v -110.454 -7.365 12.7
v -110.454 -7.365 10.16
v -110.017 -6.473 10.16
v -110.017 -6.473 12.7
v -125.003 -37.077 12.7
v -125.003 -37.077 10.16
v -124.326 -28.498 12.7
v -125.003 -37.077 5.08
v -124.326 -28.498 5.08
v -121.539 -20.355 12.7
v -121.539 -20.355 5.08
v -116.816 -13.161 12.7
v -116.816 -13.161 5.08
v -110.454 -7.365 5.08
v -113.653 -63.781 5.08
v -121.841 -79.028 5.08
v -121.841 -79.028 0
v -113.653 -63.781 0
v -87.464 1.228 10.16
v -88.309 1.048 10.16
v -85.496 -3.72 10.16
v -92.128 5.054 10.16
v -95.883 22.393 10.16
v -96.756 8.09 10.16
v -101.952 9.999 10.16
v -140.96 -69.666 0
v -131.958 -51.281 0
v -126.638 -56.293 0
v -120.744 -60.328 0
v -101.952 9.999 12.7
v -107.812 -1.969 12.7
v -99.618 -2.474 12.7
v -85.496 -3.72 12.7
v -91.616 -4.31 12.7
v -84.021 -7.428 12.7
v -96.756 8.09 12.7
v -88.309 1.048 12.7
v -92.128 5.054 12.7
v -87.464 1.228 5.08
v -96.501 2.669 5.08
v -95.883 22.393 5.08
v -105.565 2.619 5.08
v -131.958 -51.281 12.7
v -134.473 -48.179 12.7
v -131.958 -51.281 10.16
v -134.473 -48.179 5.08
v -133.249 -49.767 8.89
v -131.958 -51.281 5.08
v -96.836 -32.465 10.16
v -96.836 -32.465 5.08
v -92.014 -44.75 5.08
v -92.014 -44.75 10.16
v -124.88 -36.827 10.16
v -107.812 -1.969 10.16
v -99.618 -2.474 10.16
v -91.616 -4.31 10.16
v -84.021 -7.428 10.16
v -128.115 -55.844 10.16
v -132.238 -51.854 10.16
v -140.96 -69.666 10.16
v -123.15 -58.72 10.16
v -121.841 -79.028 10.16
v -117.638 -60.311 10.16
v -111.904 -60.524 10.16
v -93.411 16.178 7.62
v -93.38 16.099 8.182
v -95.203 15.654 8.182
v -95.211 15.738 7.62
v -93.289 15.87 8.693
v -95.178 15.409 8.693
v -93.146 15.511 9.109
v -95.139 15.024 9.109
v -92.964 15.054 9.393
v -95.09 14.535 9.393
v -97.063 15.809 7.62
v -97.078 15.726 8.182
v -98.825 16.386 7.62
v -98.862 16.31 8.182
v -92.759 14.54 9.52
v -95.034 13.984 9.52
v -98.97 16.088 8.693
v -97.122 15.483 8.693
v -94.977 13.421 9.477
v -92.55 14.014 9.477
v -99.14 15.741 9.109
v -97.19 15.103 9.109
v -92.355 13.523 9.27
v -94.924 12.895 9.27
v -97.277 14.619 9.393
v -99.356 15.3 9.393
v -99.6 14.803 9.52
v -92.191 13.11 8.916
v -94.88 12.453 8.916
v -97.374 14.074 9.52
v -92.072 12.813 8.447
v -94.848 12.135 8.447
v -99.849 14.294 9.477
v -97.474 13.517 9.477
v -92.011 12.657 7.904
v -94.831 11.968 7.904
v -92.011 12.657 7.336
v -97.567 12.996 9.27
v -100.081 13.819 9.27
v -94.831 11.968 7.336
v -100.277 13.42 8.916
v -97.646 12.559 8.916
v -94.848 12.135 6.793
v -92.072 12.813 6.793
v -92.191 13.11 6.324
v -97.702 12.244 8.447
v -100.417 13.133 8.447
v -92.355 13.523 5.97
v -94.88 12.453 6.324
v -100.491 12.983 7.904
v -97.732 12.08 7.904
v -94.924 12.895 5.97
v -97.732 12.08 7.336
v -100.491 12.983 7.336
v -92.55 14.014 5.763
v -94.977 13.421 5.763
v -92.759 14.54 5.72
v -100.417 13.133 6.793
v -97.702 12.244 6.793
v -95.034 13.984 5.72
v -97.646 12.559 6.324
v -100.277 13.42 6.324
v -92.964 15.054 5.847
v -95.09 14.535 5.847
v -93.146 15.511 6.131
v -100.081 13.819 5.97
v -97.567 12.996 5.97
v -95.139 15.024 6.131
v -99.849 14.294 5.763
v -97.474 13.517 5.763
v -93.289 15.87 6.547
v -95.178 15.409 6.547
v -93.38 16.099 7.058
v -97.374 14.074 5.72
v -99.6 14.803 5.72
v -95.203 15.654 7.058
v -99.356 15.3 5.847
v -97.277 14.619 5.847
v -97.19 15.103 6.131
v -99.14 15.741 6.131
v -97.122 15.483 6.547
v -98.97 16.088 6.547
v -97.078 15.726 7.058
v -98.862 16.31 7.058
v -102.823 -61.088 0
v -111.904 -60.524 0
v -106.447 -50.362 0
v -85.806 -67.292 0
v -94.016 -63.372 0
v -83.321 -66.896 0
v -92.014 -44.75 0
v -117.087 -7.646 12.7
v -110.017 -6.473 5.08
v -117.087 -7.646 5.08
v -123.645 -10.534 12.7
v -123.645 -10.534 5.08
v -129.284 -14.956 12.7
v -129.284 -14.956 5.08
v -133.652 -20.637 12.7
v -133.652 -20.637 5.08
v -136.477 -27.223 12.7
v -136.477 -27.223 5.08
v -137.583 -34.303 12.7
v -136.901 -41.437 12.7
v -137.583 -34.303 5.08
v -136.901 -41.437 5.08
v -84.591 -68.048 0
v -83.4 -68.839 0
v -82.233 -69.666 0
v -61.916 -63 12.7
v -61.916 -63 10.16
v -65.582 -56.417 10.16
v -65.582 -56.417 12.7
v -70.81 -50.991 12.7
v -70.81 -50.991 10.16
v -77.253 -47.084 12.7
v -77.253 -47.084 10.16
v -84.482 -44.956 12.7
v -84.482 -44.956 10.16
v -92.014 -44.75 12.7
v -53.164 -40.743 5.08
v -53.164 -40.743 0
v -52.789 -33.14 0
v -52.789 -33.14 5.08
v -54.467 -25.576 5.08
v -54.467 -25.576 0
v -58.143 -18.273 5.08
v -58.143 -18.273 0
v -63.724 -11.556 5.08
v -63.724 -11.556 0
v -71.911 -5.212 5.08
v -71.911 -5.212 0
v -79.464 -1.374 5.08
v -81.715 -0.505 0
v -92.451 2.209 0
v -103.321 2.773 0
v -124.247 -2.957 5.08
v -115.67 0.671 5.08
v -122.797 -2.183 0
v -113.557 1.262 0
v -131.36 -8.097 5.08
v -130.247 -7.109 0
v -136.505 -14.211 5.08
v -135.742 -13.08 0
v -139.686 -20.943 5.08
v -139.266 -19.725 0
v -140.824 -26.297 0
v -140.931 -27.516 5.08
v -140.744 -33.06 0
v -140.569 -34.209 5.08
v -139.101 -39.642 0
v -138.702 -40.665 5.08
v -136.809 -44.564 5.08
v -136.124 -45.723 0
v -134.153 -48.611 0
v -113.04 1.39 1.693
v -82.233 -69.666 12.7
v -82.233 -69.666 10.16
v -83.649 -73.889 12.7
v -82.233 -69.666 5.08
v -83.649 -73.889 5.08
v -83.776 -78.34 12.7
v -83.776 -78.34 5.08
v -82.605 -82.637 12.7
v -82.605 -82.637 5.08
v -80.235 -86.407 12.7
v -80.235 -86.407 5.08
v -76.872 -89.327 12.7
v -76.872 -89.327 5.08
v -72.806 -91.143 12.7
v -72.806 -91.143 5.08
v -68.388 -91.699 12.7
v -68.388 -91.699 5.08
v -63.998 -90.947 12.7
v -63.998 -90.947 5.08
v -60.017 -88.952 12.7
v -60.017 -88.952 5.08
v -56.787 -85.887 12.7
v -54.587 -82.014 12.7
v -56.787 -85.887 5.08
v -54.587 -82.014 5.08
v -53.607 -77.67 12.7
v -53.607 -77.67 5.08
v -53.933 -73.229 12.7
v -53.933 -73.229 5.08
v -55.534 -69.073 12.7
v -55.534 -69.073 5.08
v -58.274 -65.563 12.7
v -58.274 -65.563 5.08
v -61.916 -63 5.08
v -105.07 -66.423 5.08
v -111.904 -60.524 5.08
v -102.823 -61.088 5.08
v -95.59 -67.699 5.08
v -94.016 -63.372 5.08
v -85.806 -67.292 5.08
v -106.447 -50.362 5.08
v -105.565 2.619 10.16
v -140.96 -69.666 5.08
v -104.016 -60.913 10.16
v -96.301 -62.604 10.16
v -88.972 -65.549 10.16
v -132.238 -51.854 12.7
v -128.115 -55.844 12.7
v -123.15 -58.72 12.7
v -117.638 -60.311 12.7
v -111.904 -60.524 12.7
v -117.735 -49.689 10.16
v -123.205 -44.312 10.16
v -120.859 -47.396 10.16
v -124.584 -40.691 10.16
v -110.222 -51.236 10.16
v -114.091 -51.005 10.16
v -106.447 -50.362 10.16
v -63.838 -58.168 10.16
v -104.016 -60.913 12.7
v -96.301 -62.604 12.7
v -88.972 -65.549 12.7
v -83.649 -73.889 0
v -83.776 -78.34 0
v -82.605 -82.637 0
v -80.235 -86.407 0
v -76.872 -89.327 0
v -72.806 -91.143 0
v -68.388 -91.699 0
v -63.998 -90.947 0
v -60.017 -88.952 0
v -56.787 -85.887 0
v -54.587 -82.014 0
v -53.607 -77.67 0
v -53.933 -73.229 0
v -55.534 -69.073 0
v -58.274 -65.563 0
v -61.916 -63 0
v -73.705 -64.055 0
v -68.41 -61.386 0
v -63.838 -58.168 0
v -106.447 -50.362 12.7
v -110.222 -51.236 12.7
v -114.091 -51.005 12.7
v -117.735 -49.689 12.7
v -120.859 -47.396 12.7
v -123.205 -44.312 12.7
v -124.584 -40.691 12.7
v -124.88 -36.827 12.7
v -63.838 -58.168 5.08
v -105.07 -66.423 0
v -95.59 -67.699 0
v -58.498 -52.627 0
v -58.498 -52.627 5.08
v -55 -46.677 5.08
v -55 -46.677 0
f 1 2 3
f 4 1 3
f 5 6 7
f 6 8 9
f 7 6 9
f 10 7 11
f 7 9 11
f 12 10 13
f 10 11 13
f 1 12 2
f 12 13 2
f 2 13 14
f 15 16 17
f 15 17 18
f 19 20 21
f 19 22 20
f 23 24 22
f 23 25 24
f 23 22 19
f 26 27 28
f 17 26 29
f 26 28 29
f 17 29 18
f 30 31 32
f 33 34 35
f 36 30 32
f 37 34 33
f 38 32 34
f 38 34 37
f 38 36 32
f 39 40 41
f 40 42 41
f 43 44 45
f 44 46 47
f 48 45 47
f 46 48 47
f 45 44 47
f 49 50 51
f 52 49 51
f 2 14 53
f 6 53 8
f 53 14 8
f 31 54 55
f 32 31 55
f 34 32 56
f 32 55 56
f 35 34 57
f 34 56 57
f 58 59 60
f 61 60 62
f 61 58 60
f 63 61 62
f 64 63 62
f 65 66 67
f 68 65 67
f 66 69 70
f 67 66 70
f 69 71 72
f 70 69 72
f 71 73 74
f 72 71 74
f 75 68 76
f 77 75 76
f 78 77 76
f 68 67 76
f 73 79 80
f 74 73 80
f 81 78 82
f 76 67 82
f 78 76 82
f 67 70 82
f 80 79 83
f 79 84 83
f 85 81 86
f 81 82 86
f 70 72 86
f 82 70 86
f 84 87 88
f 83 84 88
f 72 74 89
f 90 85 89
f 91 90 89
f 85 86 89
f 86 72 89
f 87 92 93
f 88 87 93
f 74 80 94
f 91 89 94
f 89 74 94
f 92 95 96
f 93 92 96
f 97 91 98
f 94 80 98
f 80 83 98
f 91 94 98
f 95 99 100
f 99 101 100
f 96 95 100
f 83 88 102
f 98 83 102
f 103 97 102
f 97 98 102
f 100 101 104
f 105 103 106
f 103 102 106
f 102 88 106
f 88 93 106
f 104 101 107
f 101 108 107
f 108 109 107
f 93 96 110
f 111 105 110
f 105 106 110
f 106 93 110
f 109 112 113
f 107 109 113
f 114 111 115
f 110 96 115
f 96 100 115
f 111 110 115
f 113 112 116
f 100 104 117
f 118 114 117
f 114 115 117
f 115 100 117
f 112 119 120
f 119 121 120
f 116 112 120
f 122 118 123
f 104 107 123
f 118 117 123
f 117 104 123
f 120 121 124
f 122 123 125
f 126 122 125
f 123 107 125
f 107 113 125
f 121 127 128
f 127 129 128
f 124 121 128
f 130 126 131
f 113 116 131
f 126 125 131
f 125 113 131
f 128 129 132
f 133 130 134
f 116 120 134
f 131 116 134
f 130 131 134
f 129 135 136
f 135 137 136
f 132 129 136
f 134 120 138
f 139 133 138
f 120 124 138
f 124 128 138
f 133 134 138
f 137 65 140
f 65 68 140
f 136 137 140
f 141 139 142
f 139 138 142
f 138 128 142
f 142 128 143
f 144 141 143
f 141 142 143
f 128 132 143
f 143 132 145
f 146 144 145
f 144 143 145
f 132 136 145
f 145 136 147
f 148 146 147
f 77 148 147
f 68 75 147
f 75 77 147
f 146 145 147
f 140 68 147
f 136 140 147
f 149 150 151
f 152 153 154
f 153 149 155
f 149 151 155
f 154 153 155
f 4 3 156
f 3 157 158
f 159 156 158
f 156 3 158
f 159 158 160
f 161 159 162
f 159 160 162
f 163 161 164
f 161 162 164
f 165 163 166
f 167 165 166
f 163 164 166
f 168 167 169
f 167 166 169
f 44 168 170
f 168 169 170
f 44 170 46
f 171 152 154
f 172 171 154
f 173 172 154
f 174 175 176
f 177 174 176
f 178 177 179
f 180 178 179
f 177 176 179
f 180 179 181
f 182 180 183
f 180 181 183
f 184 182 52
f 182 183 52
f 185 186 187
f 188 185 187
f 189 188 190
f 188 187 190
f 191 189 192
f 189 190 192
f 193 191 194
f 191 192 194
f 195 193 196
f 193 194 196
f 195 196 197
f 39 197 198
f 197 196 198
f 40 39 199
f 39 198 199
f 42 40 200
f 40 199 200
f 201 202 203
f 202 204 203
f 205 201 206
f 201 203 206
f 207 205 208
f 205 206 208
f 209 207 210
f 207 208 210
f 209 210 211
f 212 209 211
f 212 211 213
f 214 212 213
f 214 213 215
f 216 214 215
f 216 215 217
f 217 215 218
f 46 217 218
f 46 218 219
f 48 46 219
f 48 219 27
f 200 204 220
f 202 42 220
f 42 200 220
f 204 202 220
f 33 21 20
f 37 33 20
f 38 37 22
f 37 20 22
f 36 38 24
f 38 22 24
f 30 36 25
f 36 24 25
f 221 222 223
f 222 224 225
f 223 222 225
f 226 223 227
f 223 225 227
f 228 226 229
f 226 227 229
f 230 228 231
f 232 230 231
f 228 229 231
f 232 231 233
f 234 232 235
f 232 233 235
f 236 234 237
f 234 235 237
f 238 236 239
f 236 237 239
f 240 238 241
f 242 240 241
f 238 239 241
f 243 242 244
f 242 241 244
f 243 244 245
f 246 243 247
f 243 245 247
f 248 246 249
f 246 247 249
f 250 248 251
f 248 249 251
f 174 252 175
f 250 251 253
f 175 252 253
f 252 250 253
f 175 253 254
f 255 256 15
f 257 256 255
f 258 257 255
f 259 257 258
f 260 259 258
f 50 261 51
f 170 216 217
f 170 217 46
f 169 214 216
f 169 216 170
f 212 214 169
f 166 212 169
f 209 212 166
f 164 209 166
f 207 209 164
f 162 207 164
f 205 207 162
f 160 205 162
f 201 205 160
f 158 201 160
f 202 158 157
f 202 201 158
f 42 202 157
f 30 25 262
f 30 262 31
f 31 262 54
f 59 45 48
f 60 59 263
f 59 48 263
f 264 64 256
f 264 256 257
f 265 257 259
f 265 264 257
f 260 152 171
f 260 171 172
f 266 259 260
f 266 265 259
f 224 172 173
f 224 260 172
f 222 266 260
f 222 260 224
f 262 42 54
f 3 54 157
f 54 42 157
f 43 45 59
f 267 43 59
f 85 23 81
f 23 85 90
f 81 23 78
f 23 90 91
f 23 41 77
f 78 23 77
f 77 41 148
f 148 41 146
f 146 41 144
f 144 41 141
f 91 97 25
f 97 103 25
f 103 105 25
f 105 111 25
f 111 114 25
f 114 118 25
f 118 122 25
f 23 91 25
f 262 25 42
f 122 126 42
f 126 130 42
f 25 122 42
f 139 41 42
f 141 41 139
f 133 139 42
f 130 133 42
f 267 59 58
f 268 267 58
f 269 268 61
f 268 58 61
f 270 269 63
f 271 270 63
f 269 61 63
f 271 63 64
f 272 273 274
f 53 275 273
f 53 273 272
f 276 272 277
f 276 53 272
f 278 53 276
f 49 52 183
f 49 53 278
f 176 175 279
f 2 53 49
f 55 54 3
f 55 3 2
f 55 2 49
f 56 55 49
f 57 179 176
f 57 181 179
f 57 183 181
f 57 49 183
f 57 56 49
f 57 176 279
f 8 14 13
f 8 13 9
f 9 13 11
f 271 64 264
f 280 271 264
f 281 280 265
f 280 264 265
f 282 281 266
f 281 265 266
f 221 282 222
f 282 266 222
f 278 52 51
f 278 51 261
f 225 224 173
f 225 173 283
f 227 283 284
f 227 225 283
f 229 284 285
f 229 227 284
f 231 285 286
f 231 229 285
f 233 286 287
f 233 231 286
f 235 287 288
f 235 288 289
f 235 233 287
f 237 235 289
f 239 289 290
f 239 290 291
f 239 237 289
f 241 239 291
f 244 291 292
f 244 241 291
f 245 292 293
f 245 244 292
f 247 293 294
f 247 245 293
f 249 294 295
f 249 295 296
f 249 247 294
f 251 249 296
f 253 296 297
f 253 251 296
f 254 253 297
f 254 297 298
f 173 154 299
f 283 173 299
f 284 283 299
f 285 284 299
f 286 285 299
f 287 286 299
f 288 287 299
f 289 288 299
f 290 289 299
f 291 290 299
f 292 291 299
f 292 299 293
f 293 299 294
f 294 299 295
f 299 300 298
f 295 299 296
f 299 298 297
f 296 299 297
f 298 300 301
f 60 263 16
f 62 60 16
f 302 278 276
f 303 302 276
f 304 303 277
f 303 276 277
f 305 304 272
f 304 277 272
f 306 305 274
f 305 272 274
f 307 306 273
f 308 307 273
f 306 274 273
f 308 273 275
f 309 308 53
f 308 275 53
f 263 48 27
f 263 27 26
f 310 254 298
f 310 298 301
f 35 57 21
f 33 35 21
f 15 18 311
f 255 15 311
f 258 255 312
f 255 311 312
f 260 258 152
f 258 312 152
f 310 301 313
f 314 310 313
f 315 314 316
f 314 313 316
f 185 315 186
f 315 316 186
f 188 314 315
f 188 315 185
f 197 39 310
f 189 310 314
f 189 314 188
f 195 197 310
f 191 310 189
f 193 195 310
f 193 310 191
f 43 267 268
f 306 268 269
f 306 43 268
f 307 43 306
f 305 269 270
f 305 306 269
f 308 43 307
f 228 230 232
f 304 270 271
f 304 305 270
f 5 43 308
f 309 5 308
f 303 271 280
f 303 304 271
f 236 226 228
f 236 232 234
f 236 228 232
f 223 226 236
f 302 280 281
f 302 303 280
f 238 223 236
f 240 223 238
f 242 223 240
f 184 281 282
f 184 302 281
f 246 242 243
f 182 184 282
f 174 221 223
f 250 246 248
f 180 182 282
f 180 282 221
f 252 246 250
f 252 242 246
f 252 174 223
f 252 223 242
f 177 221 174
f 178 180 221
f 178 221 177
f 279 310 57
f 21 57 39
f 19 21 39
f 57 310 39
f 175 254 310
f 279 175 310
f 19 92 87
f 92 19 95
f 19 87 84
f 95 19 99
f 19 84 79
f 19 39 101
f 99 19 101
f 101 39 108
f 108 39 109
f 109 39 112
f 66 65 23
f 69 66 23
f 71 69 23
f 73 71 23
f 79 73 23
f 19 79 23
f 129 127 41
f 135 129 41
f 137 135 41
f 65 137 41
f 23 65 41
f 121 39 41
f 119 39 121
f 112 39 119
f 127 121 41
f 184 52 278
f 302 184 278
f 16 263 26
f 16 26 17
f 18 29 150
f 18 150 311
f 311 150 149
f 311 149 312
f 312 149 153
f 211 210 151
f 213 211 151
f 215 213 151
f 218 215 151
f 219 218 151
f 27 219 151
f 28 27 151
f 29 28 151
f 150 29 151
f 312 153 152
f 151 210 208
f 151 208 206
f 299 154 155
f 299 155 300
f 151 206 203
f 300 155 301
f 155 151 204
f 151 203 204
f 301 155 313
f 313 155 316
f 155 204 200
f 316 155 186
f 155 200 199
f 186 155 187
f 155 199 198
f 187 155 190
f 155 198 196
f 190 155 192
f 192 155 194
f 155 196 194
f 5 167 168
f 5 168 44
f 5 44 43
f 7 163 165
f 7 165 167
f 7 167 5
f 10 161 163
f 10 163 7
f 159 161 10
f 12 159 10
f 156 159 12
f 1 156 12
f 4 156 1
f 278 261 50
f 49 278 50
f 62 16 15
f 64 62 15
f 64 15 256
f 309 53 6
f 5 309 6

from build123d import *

# Parameters (mm, degrees)
F1_DEPTH  = 5.08
F3_DEPTH  = 5.08
F5_DEPTH  = 2.54
F7_DEPTH  = 10.16
F8_DEPTH  = 5.08
F9_DEPTH  = 5.08
F11_DEPTH = 7.62
F12_DEPTH = 2.54
F13_R     = 1.905


with BuildPart() as f1:
    # F0 (on Top) → F1 (new body)
    with BuildSketch(Plane.XY):
        with BuildLine():
            add(Edge.make_bspline(
                [(-53.1635676672, -40.7425994368), (-41.8989411061, 18.6911877843), (-113.0400156659, 1.3903249669), (-184.1810902258, -15.9105378505), (-124.304642227, -58.0434622542), (-64.4281942283, -100.1763866579), (-53.1635676672, -40.7425994368)],
                knots=[0, 0, 0, 2.0943951024, 2.0943951024, 4.1887902048, 4.1887902048, 6.2831853072, 6.2831853072, 6.2831853072], degree=2, weights=[1, 0.5, 1, 0.5, 1, 0.5, 1]))
        make_face()
    extrude(amount=F1_DEPTH)

    # F2 (on face) → F3 (join)
    with BuildSketch(Plane.XY.offset(5.08)):
        with BuildLine():
            Line((-131.9579197109, -51.2809136758), (-140.9604847431, -69.6664303541))
            Line((-140.9604847431, -69.6664303541), (-121.8411935672, -79.0282919321))
            Line((-121.8411935672, -79.0282919321), (-113.6531802251, -63.7810597846))
            add(Edge.make_bspline(
                [(-131.9579197109, -51.2809136758), (-128.6186368439, -55.0078578531), (-124.304642227, -58.0434622542), (-119.420845427, -61.4800161624), (-113.6531802251, -63.7810597846)],
                knots=[3.9072776048, 3.9072776048, 3.9072776048, 4.1887902048, 4.1887902048, 4.50468154, 4.50468154, 4.50468154], degree=2, weights=[0.8836543185, 0.9327938173, 1, 0.9245864988, 0.8719217822]))
        make_face()
        with BuildLine():
            Line((-105.5654466698, 2.6191971859), (-131.9579197109, -51.2809136758))
            add(Edge.make_bspline(
                [(-131.9579197109, -51.2809136758), (-128.6186368439, -55.0078578531), (-124.304642227, -58.0434622542), (-119.420845427, -61.4800161624), (-113.6531802251, -63.7810597846)],
                knots=[3.9072776048, 3.9072776048, 3.9072776048, 4.1887902048, 4.1887902048, 4.50468154, 4.50468154, 4.50468154], degree=2, weights=[0.8836543185, 0.9327938173, 1, 0.9245864988, 0.8719217822]))
            Line((-113.6531802251, -63.7810597846), (-96.8360751867, -32.4652455747))
            Line((-96.8360751867, -32.4652455747), (-83.3206423237, -66.8956124574))
            add(Edge.make_bspline(
                [(-83.3206423237, -66.8956124574), (-71.8467350955, -64.7720622624), (-63.8384492188, -58.1680738766)],
                knots=[5.1773121683, 5.1773121683, 5.1773121683, 5.6685915269, 5.6685915269, 5.6685915269], degree=2, weights=[0.7507848699, 0.7442133059, 0.7926641772]))
            Line((-63.8384492188, -58.1680738766), (-87.4642972057, 1.227759617))
            add(Edge.make_bspline(
                [(-87.4642972057, 1.227759617), (-96.5007837018, 3.4317958299), (-105.5654466698, 2.6191971859)],
                knots=[1.4695457005, 1.4695457005, 1.4695457005, 1.8905356916, 1.8905356916, 1.8905356916], degree=2, weights=[0.7906652984, 0.8311998282, 0.9121385395]))
        make_face()
        with BuildLine():
            add(Edge.make_bspline(
                [(-83.3206423237, -66.8956124574), (-71.8467350955, -64.7720622624), (-63.8384492188, -58.1680738766)],
                knots=[5.1773121683, 5.1773121683, 5.1773121683, 5.6685915269, 5.6685915269, 5.6685915269], degree=2, weights=[0.7507848699, 0.7442133059, 0.7926641772]))
            Line((-83.3206423237, -66.8956124574), (-82.2329744697, -69.6664303541))
            ThreePointArc((-82.2329744697, -69.6664303541), (-63.9982257769, -90.9472868448), (-61.9164295495, -63.0000680685))
            Line((-61.9164295495, -63.0000680685), (-63.8384492188, -58.1680738766))
        make_face()
        with BuildLine():
            Line((-95.8831459284, 22.3929062486), (-105.5654466698, 2.6191971859))
            add(Edge.make_bspline(
                [(-87.4642972057, 1.227759617), (-96.5007837018, 3.4317958299), (-105.5654466698, 2.6191971859)],
                knots=[1.4695457005, 1.4695457005, 1.4695457005, 1.8905356916, 1.8905356916, 1.8905356916], degree=2, weights=[0.7906652984, 0.8311998282, 0.9121385395]))
            Line((-87.4642972057, 1.227759617), (-95.8831459284, 22.3929062486))
        make_face()
    extrude(amount=F3_DEPTH)

    # F4 (on face) → F5 (join)
    with BuildSketch(Plane.XY.offset(10.16)):
        with BuildLine():
            ThreePointArc((-82.2329744697, -69.6664303541), (-63.9982257769, -90.9472868448), (-61.9164295495, -63.0000680685))
            ThreePointArc((-61.9164295495, -63.0000680685), (-73.905031166, -48.8285086128), (-92.013752266, -44.7500424488))
            Line((-92.013752266, -44.7500424488), (-82.2329744697, -69.6664303541))
        make_face()
        with BuildLine():
            Line((-82.2329744697, -69.6664303541), (-92.013752266, -44.7500424488))
            Line((-92.013752266, -44.7500424488), (-106.4470403828, -50.3622141534))
            Line((-106.4470403828, -50.3622141534), (-111.9039820196, -60.5238067737))
            ThreePointArc((-111.9039820196, -60.5238067737), (-96.3007764713, -62.6036581083), (-82.2329744697, -69.6664303541))
        make_face()
        with BuildLine():
            Line((-111.9039820196, -60.5238067737), (-106.4470403828, -50.3622141534))
            ThreePointArc((-106.4470403828, -50.3622141534), (-119.3794542725, -48.6548728117), (-124.8804196152, -36.8268669033))
            Line((-124.8804196152, -36.8268669033), (-132.2383726809, -51.8536696336))
            ThreePointArc((-132.2383726809, -51.8536696336), (-123.1504906465, -58.7200912674), (-111.9039820196, -60.5238067737))
        make_face()
    extrude(amount=F5_DEPTH)

    # F7 (add): a face of the model
    f7_faces = [f1.faces().sort_by_distance(p)[0] for p in [
        (-96.5809599227, -56.2228804189, 10.16),
    ]]
    extrude(f7_faces, amount=F7_DEPTH)

    # F8 (add): a face of the model
    f8_faces = [f1.faces().sort_by_distance(p)[0] for p in [
        (-127.5392459391, -66.1235419856, 5.08),
    ]]
    extrude(f8_faces, amount=F8_DEPTH)

    # F9 (add): a face of the model
    f9_faces = [f1.faces().sort_by_distance(p)[0] for p in [
        (-68.6388215129, -76.4740185579, 5.08),
    ]]
    extrude(f9_faces, amount=F9_DEPTH)

    # F6 (on face) → F11 (join)
    with BuildSketch(Plane.XY.offset(5.08)):
        with BuildLine():
            Line((-110.4541125519, -7.3646960477), (-110.0173115332, -6.472637797))
            ThreePointArc((-110.0173115332, -6.472637797), (-133.6523206327, -20.6370610227), (-134.4729876641, -48.1792295299))
            add(Edge.make_bspline(
                [(-134.4729876641, -48.1792295299), (-133.3080685152, -49.7740244947), (-131.9579197109, -51.2809136758)],
                knots=[3.801700486, 3.801700486, 3.801700486, 3.9072776048, 3.9072776048, 3.9072776048], degree=2, weights=[0.8493373441, 0.8652252795, 0.8836543185]))
            Line((-131.9579197109, -51.2809136758), (-125.0028994796, -37.0770017905))
            ThreePointArc((-125.0028994796, -37.0770017905), (-121.5386762873, -20.355178987), (-110.4541125519, -7.3646960477))
        make_face()
    extrude(amount=F11_DEPTH)

    # F10 (on face) → F12 (join)
    with BuildSketch(Plane.XY.offset(10.16)):
        with BuildLine():
            ThreePointArc((-107.8121787601, -1.9691984736), (-95.5792010439, -3.2282254929), (-84.0211259134, -7.428438835))
            Line((-84.0211259134, -7.428438835), (-85.4962270154, -3.7200064649))
            ThreePointArc((-85.4962270154, -3.7200064649), (-92.128084348, 5.0538321922), (-101.9519128194, 9.9989480276))
            Line((-101.9519128194, 9.9989480276), (-107.8121787601, -1.9691984736))
        make_face()
    extrude(amount=F12_DEPTH)

    # F13 (on face) → F14 (revolve, cut)
    with BuildSketch(Plane(origin=(-75.09444818, -29.8702773075, 0), x_dir=(-0.3696032606, 0.9291896629, 0), z_dir=(0.9291896629, 0.3696032606, 0))):
        with Locations((47.6521402597, 7.62)):
            Circle(F13_R)
    revolve(axis=Axis((-95.8831459284, 22.3929062486, 7.62), (0, 0, -1)), mode=Mode.SUBTRACT)


solid = f1.part
